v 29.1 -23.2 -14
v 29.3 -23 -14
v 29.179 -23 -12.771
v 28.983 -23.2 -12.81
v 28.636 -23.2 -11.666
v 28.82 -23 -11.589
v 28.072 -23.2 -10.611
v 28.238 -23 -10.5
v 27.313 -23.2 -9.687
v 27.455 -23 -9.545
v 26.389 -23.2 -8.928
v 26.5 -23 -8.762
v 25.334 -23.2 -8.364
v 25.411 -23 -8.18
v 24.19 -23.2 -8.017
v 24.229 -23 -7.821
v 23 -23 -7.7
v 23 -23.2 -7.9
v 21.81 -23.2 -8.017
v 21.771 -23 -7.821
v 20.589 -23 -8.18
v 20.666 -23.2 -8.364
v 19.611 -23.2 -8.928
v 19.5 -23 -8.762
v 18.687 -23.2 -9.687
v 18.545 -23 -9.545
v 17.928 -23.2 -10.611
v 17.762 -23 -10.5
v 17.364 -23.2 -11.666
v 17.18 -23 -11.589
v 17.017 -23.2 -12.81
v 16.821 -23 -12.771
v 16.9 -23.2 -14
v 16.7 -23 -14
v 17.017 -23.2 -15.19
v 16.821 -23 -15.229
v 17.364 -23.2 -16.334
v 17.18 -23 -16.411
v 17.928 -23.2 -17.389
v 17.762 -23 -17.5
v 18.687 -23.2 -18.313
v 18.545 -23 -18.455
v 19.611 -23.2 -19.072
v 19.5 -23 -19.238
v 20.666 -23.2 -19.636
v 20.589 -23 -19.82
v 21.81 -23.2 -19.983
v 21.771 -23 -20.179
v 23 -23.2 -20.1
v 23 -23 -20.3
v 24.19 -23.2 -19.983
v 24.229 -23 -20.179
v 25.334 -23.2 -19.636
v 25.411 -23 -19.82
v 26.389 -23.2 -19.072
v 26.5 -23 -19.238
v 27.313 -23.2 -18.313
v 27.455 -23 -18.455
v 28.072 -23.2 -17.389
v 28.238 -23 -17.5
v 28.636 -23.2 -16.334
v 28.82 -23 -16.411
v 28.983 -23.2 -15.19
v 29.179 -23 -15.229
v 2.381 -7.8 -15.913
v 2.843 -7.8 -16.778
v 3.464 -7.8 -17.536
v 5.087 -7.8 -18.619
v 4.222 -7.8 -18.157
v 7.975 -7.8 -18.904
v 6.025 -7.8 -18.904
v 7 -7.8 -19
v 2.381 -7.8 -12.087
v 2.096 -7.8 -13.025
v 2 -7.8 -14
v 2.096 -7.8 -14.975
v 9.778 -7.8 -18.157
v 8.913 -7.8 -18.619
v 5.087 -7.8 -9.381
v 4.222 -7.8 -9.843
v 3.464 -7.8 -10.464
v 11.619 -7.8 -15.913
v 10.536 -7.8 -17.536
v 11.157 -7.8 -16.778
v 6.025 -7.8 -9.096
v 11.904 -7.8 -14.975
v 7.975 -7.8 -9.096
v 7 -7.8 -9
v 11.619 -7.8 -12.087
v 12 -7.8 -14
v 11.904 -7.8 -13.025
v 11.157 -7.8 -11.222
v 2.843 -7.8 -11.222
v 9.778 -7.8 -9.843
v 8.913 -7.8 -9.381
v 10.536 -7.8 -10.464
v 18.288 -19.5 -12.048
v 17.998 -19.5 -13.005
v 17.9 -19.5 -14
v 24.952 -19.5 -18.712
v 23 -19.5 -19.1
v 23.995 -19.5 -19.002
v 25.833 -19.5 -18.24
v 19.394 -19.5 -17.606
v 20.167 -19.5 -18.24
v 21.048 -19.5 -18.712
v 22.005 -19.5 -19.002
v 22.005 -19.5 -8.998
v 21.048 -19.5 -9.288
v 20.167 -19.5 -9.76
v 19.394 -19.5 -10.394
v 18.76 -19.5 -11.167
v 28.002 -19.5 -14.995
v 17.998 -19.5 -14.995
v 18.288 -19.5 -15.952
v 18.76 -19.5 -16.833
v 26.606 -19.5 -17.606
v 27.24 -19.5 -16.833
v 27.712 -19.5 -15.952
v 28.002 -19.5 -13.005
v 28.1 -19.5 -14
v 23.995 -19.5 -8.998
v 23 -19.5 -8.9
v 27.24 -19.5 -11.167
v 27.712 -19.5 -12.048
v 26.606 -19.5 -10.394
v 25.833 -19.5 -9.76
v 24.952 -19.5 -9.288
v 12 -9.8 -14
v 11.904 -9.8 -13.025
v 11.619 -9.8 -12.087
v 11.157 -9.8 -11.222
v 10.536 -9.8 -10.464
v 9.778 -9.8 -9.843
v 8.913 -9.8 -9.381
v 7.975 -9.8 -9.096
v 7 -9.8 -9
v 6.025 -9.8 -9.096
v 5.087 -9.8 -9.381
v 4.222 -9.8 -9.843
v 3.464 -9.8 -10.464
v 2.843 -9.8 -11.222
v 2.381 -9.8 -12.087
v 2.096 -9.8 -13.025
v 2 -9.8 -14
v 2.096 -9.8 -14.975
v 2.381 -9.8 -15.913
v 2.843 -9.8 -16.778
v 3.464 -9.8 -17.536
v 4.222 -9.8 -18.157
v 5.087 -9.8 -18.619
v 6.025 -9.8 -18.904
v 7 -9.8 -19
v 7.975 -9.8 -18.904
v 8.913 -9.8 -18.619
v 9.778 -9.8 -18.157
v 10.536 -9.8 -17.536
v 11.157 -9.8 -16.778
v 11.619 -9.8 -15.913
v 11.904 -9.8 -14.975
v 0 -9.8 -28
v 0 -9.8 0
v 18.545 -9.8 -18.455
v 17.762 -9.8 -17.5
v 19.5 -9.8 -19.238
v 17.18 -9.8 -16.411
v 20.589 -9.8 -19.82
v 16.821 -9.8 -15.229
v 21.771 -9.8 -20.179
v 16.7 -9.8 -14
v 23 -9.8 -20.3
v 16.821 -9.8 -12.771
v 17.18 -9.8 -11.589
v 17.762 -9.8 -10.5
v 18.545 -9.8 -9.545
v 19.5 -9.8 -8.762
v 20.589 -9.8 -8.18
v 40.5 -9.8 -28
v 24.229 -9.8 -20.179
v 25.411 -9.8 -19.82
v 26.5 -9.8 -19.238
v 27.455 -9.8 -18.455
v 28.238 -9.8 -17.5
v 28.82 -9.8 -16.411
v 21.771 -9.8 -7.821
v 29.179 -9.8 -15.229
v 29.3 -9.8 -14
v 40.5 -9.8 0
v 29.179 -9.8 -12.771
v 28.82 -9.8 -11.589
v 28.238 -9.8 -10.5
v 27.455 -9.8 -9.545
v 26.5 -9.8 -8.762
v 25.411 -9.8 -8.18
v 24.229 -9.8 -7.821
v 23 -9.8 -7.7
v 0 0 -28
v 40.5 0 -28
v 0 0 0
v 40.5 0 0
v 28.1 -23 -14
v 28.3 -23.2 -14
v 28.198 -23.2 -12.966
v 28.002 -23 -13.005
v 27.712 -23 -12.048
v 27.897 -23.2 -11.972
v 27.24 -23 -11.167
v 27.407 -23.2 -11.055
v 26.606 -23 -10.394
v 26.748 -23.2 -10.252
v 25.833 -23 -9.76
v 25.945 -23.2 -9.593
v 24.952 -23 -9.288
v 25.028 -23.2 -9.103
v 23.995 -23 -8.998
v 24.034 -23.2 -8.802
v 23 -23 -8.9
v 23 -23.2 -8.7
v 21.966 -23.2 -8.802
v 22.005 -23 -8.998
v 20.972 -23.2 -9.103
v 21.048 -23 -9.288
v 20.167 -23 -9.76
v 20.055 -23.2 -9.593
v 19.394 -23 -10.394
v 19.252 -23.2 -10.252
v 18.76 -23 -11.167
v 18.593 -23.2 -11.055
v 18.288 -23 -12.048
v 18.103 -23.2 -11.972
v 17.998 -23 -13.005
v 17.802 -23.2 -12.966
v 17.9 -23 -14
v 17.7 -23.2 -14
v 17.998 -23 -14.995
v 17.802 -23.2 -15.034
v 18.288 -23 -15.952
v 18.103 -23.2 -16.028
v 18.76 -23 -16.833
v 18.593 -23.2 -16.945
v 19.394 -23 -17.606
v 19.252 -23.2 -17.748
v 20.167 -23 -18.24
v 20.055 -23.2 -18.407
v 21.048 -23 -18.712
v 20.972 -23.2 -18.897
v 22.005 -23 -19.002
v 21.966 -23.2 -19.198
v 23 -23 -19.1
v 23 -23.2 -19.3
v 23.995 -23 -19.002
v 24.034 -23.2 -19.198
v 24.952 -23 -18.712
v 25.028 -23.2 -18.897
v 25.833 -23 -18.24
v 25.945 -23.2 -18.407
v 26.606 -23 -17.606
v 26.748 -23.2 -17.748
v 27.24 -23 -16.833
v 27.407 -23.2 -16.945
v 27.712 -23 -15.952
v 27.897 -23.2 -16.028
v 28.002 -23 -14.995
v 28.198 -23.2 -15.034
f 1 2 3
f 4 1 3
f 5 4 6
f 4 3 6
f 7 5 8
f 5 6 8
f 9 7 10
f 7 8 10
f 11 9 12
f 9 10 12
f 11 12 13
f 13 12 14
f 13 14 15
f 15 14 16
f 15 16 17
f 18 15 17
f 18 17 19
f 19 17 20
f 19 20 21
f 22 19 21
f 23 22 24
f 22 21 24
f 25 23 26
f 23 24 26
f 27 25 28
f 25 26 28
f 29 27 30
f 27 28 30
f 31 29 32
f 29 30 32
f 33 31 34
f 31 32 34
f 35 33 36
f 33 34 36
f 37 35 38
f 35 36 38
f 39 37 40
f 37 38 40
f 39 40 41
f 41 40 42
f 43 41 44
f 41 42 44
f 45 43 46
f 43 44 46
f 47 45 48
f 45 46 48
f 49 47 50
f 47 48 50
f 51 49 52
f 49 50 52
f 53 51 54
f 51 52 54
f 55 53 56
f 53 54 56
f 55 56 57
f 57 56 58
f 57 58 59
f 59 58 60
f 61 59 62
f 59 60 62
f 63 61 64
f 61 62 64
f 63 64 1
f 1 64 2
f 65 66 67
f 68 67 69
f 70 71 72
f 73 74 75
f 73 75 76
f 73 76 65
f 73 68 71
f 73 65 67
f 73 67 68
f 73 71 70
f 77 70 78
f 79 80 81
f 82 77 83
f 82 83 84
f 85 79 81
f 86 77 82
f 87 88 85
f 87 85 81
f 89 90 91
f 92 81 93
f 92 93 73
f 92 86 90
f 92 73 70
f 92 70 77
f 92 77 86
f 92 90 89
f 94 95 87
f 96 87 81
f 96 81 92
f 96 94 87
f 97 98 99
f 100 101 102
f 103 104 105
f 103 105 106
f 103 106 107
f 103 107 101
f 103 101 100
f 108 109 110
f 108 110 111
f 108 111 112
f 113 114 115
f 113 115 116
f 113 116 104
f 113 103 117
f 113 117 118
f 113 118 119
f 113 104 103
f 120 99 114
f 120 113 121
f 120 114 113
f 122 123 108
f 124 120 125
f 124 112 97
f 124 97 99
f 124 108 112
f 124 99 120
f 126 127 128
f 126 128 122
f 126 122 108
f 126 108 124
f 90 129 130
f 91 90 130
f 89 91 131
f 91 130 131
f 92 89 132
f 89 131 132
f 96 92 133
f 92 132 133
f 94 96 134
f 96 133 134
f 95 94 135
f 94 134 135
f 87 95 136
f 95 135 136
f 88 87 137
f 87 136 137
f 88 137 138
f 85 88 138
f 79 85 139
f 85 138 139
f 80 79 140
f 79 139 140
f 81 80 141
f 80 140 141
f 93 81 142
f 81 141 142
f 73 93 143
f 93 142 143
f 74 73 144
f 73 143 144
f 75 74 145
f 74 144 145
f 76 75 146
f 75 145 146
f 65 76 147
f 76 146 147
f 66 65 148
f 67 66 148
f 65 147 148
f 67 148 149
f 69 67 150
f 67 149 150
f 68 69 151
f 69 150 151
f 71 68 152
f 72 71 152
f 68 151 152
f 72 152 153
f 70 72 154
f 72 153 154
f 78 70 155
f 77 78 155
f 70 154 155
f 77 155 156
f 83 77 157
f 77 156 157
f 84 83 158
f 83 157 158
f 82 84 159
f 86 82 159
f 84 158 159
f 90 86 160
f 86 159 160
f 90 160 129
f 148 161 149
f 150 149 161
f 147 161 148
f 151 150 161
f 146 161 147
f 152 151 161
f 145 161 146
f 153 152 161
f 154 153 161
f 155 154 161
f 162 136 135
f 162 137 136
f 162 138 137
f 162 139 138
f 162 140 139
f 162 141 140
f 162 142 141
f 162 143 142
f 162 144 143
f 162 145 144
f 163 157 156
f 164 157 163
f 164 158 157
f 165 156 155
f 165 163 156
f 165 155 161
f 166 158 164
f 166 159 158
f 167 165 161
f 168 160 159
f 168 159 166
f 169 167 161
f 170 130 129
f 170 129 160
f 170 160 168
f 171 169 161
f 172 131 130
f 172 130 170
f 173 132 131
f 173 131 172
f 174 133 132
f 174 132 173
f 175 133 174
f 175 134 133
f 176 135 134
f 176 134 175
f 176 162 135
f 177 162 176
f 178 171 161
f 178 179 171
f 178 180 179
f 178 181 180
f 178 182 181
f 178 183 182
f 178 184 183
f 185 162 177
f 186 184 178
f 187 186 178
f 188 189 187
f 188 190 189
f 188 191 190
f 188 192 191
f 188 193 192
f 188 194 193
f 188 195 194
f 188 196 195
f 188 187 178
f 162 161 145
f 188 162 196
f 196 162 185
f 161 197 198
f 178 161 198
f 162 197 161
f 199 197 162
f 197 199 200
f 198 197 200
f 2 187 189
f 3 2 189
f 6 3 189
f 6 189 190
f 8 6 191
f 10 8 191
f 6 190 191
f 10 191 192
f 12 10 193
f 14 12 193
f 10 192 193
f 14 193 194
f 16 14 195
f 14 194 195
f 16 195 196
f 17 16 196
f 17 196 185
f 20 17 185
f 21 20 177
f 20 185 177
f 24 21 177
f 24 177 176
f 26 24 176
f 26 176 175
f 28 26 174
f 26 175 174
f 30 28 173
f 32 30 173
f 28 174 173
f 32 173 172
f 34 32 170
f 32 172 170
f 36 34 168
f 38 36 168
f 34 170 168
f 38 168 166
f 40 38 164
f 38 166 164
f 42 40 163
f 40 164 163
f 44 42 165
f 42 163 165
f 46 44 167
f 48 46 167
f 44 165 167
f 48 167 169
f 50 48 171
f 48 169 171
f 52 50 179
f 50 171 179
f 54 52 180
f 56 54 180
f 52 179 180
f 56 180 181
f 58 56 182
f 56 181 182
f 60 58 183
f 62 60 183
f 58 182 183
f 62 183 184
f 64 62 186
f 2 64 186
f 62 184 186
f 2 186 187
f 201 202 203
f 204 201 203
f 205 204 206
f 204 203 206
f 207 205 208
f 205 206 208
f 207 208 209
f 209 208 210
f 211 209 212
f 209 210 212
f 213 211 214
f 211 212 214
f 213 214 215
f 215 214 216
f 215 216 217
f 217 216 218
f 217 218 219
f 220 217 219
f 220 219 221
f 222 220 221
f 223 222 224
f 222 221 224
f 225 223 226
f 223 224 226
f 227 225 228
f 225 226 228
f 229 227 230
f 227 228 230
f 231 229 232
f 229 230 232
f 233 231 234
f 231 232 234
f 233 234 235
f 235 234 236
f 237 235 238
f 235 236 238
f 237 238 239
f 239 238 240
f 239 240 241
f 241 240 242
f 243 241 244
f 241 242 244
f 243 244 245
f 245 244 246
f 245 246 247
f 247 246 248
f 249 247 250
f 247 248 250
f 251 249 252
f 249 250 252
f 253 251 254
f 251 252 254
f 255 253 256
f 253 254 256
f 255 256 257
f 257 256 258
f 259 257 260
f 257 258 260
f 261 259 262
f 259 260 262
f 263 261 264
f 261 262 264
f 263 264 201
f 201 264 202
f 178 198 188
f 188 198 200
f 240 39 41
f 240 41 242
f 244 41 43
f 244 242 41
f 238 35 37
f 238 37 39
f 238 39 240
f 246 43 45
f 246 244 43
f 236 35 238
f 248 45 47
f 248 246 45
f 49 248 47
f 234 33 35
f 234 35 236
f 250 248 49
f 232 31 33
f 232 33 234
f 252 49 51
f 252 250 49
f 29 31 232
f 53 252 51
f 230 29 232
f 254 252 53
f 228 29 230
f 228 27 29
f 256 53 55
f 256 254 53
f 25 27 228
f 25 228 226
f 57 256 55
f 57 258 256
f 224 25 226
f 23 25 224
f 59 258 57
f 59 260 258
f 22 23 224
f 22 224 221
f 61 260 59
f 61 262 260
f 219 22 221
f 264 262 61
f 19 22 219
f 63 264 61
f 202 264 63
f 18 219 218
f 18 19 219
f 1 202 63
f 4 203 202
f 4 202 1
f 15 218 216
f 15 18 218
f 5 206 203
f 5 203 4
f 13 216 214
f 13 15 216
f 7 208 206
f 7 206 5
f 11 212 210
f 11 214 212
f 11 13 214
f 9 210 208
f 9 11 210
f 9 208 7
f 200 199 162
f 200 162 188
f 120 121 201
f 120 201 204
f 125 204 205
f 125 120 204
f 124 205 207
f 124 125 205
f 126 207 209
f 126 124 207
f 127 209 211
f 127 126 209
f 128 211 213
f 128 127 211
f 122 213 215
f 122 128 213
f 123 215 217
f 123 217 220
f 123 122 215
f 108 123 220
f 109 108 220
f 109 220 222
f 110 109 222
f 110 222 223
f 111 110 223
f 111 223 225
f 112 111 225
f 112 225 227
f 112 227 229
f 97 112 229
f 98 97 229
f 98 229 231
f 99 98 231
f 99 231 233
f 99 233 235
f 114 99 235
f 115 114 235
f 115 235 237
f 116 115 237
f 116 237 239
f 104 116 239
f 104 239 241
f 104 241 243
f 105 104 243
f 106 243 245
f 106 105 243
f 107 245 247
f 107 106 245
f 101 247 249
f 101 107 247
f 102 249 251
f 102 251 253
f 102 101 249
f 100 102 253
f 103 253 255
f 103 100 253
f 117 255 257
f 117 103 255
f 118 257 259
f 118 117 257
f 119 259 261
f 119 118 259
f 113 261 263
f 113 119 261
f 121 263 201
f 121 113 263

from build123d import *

# Parameters (mm, degrees)
F0_W      = 40.5
F0_H      = 28
F1_DEPTH  = 9.8
F2_R      = 6.3
F2_R_2    = 5.1
F3_DEPTH  = 13.4
F3_FACE_R = 5.1
F4_DEPTH  = 9.7
F5_R      = 5
F6_DEPTH  = 2
F7_SIZE   = 0.2


with BuildPart() as f1:
    # F0 (on Front) → F1 (new body)
    with BuildSketch(Plane.XZ):
        with Locations((20.25, -14)):
            Rectangle(F0_W, F0_H)
    extrude(amount=F1_DEPTH)

    # F2 (on face) → F3 (join)
    with BuildSketch(Plane.XZ.offset(9.8)):
        with Locations((23, -14)):
            Circle(F2_R)
        with Locations((23, -14)):
            Circle(F2_R_2, mode=Mode.SUBTRACT)
    extrude(amount=F3_DEPTH)

    # F3_face (on face) → F4 (join)
    with BuildSketch(Plane(origin=(23, -9.8, -14), x_dir=(1, 0, 0), z_dir=(0, -1, 0))):
        Circle(F3_FACE_R)
    extrude(amount=F4_DEPTH)

    # F5 (on face) → F6 (cut)
    with BuildSketch(Plane.XZ.offset(9.8)):
        with Locations((7, -14)):
            Circle(F5_R)
    extrude(amount=-F6_DEPTH, mode=Mode.SUBTRACT)

    # F7
    f7_edges = [f1.edges().sort_by_distance(p)[0] for p in [
        (17.9, -23.2, -14),
        (16.7, -23.2, -14),
    ]]
    chamfer(f7_edges, length=F7_SIZE)


solid = f1.part
